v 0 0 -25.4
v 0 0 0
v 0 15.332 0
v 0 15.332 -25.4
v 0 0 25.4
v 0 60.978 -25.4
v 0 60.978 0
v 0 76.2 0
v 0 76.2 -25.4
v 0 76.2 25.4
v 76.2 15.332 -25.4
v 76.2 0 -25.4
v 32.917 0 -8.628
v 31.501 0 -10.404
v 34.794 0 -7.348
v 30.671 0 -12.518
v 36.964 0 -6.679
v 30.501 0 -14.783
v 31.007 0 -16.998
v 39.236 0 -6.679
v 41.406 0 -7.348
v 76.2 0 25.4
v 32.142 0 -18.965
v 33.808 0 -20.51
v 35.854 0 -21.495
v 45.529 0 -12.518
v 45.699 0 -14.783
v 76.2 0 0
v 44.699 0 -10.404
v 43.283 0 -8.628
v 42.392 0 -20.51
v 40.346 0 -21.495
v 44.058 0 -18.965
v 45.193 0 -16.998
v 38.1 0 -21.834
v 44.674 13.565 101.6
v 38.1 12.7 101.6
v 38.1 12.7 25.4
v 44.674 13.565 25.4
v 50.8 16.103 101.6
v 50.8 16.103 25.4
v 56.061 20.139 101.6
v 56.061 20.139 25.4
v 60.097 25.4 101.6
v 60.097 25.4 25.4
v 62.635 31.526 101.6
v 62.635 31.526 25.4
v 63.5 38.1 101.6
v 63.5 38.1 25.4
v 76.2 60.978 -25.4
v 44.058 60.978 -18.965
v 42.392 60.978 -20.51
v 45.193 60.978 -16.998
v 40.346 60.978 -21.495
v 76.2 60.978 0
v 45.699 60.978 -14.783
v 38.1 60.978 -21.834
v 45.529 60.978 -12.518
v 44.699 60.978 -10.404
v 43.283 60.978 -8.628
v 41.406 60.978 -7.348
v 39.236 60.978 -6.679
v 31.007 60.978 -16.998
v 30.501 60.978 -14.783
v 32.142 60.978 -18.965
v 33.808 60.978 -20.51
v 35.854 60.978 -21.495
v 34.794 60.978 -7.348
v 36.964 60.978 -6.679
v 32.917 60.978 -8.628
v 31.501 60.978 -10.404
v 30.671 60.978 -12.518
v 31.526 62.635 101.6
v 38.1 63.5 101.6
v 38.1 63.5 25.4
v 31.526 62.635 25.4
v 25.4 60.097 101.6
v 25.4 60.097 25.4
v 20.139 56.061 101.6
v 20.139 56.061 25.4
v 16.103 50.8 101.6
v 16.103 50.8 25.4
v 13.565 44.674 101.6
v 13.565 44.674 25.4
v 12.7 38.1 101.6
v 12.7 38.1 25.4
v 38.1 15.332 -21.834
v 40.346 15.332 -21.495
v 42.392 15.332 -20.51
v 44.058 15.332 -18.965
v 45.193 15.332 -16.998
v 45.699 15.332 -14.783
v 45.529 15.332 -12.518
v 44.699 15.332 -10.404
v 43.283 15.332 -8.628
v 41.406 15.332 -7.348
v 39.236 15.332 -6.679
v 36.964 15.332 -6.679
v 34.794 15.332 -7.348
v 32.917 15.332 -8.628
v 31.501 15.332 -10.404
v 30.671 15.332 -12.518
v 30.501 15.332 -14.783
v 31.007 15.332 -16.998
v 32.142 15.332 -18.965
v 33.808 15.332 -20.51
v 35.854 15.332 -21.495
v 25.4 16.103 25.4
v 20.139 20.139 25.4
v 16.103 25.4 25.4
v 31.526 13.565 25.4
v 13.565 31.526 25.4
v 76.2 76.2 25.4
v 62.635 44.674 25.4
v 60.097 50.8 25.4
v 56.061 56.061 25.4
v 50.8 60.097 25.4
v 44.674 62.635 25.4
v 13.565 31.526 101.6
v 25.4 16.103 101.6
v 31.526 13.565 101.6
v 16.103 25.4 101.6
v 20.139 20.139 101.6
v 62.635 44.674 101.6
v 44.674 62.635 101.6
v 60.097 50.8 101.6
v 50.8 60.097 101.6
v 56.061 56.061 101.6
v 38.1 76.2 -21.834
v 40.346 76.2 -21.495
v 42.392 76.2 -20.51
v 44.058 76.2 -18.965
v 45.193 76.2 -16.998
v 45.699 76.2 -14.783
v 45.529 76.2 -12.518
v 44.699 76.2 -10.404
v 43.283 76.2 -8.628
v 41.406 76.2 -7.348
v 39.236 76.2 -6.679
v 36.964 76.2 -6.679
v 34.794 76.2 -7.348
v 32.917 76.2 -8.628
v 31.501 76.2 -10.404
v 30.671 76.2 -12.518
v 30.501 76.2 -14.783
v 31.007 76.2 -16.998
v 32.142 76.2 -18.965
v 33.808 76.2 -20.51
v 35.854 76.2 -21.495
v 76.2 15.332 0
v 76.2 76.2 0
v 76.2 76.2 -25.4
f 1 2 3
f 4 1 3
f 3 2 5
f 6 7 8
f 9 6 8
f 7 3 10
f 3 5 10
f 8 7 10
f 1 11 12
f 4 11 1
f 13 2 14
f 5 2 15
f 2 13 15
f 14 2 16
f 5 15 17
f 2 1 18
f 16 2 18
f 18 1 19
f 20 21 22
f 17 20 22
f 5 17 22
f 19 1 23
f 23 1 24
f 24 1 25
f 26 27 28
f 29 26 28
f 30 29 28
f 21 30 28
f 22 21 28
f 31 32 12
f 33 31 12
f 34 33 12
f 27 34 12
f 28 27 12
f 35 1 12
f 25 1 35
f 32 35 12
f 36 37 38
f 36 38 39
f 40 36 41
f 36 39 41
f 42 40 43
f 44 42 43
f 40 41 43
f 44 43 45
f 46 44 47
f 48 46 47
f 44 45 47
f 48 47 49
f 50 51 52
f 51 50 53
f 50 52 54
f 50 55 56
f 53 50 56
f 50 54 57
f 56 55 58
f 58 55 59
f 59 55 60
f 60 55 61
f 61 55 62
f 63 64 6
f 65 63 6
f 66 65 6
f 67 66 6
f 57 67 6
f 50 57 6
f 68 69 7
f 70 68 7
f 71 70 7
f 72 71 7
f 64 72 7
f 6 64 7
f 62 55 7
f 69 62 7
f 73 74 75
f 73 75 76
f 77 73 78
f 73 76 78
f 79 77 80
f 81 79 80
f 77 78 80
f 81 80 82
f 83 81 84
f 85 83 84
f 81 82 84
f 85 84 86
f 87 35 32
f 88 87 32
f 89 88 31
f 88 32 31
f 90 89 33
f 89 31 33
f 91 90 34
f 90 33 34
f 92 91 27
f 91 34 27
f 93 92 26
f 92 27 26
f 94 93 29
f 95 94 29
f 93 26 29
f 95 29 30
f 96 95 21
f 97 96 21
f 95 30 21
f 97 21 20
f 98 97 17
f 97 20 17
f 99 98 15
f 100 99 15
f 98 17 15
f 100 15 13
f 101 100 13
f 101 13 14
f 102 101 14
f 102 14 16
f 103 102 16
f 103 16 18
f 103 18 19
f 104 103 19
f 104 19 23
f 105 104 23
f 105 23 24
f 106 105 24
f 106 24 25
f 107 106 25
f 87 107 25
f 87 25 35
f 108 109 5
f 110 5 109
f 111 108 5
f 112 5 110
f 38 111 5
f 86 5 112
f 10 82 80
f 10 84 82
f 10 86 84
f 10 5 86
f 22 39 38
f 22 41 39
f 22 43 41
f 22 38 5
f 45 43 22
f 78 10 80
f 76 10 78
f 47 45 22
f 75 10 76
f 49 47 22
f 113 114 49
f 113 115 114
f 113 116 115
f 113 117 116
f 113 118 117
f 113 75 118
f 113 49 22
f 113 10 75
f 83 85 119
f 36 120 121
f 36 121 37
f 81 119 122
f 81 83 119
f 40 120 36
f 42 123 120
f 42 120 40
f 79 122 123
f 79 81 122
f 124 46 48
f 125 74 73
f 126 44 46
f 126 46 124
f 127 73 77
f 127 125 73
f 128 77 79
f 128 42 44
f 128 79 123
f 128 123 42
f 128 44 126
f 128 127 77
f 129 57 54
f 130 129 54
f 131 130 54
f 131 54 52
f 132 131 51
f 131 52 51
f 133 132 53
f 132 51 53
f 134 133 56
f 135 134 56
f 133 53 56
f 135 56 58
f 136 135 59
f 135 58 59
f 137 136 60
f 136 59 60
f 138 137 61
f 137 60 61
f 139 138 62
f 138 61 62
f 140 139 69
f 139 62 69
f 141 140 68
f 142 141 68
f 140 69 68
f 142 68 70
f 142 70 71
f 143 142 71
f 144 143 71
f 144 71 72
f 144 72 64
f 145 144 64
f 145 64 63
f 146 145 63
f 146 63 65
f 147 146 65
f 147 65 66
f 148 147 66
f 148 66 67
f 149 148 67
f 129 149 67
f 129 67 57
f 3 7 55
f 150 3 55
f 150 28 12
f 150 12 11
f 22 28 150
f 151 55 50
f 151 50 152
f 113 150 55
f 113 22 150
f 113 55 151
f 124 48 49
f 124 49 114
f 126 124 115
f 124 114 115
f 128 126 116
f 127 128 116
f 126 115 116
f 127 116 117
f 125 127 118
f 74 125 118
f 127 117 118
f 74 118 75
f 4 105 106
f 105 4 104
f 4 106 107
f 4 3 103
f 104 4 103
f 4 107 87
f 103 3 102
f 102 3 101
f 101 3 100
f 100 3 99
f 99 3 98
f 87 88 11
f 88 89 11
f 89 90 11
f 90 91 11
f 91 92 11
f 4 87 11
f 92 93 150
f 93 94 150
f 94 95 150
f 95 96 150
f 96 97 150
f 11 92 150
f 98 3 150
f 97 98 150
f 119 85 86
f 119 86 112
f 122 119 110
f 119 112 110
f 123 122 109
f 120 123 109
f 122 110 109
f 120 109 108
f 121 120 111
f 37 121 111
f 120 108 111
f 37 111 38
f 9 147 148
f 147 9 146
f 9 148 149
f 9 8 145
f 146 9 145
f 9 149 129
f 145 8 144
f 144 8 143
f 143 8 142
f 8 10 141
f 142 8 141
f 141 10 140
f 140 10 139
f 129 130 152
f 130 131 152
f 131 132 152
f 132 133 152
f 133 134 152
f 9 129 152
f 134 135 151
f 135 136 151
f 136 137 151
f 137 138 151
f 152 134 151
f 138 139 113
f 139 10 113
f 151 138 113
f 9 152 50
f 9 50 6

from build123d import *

# Parameters (mm, degrees)
SKETCH5_W           = 76.2
SKETCH5_H           = 76.2
BOSS_EXTRUDE3_DEPTH = 25.4
BOSS_EXTRUDE4_DEPTH = 76.2
SKETCH7_W           = 38.1
SKETCH7_H           = 15.221971119
SKETCH7_H_2         = 15.332492997
BOSS_EXTRUDE5_DEPTH = 25.4
SKETCH8_R           = 7.62
CUT_EXTRUDE1_DEPTH  = 149.106178129


with BuildPart() as part:
    # Sketch5 → Boss-Extrude3 (new body)
    with BuildSketch(Plane.XY):
        with Locations((38.1, 38.1)):
            Rectangle(SKETCH5_W, SKETCH5_H)
    extrude(amount=BOSS_EXTRUDE3_DEPTH)

    # Sketch6 → Boss-Extrude4 (add)
    with BuildSketch(Plane.XY.offset(25.4)):
        with BuildLine():
            ThreePointArc((63.5, 38.1), (56.060512242, 56.060512242), (38.1, 63.5))
            Line((38.1, 63.5), (38.1, 38.1))
            Line((38.1, 38.1), (63.5, 38.1))
        make_face()
        with BuildLine():
            Line((38.1, 38.1), (38.1, 63.5))
            ThreePointArc((38.1, 63.5), (20.139487758, 56.060512242), (12.7, 38.1))
            Line((12.7, 38.1), (38.1, 38.1))
        make_face()
        with BuildLine():
            Line((63.5, 38.1), (38.1, 38.1))
            Line((38.1, 38.1), (38.1, 12.7))
            ThreePointArc((38.1, 12.7), (56.060512242, 20.139487758), (63.5, 38.1))
        make_face()
        with BuildLine():
            Line((38.1, 12.7), (38.1, 38.1))
            Line((38.1, 38.1), (12.7, 38.1))
            ThreePointArc((12.7, 38.1), (20.139487758, 20.139487758), (38.1, 12.7))
        make_face()
    extrude(amount=BOSS_EXTRUDE4_DEPTH)

    # Sketch7 → Boss-Extrude5 (add)
    with BuildSketch(Plane(origin=(0, 0, 0), x_dir=(-1, 0, 0), z_dir=(0, 0, -1))):
        with Locations((-57.15, 68.589014441)):
            Rectangle(SKETCH7_W, SKETCH7_H)
        with Locations((-19.05, 68.589014441)):
            Rectangle(SKETCH7_W, SKETCH7_H)
        with Locations((-57.15, 7.666246499)):
            Rectangle(SKETCH7_W, SKETCH7_H_2)
        with Locations((-19.05, 7.666246499)):
            Rectangle(SKETCH7_W, SKETCH7_H_2)
    extrude(amount=BOSS_EXTRUDE5_DEPTH)

    # Sketch8 → Cut-Extrude1 (cut, through all)
    with BuildSketch(Plane.XZ):
        with Locations(Location((38.1, -14.21368923, 0), (0, 0, 270))):
            Circle(SKETCH8_R)
    extrude(amount=-CUT_EXTRUDE1_DEPTH, mode=Mode.SUBTRACT)


solid = part.part
